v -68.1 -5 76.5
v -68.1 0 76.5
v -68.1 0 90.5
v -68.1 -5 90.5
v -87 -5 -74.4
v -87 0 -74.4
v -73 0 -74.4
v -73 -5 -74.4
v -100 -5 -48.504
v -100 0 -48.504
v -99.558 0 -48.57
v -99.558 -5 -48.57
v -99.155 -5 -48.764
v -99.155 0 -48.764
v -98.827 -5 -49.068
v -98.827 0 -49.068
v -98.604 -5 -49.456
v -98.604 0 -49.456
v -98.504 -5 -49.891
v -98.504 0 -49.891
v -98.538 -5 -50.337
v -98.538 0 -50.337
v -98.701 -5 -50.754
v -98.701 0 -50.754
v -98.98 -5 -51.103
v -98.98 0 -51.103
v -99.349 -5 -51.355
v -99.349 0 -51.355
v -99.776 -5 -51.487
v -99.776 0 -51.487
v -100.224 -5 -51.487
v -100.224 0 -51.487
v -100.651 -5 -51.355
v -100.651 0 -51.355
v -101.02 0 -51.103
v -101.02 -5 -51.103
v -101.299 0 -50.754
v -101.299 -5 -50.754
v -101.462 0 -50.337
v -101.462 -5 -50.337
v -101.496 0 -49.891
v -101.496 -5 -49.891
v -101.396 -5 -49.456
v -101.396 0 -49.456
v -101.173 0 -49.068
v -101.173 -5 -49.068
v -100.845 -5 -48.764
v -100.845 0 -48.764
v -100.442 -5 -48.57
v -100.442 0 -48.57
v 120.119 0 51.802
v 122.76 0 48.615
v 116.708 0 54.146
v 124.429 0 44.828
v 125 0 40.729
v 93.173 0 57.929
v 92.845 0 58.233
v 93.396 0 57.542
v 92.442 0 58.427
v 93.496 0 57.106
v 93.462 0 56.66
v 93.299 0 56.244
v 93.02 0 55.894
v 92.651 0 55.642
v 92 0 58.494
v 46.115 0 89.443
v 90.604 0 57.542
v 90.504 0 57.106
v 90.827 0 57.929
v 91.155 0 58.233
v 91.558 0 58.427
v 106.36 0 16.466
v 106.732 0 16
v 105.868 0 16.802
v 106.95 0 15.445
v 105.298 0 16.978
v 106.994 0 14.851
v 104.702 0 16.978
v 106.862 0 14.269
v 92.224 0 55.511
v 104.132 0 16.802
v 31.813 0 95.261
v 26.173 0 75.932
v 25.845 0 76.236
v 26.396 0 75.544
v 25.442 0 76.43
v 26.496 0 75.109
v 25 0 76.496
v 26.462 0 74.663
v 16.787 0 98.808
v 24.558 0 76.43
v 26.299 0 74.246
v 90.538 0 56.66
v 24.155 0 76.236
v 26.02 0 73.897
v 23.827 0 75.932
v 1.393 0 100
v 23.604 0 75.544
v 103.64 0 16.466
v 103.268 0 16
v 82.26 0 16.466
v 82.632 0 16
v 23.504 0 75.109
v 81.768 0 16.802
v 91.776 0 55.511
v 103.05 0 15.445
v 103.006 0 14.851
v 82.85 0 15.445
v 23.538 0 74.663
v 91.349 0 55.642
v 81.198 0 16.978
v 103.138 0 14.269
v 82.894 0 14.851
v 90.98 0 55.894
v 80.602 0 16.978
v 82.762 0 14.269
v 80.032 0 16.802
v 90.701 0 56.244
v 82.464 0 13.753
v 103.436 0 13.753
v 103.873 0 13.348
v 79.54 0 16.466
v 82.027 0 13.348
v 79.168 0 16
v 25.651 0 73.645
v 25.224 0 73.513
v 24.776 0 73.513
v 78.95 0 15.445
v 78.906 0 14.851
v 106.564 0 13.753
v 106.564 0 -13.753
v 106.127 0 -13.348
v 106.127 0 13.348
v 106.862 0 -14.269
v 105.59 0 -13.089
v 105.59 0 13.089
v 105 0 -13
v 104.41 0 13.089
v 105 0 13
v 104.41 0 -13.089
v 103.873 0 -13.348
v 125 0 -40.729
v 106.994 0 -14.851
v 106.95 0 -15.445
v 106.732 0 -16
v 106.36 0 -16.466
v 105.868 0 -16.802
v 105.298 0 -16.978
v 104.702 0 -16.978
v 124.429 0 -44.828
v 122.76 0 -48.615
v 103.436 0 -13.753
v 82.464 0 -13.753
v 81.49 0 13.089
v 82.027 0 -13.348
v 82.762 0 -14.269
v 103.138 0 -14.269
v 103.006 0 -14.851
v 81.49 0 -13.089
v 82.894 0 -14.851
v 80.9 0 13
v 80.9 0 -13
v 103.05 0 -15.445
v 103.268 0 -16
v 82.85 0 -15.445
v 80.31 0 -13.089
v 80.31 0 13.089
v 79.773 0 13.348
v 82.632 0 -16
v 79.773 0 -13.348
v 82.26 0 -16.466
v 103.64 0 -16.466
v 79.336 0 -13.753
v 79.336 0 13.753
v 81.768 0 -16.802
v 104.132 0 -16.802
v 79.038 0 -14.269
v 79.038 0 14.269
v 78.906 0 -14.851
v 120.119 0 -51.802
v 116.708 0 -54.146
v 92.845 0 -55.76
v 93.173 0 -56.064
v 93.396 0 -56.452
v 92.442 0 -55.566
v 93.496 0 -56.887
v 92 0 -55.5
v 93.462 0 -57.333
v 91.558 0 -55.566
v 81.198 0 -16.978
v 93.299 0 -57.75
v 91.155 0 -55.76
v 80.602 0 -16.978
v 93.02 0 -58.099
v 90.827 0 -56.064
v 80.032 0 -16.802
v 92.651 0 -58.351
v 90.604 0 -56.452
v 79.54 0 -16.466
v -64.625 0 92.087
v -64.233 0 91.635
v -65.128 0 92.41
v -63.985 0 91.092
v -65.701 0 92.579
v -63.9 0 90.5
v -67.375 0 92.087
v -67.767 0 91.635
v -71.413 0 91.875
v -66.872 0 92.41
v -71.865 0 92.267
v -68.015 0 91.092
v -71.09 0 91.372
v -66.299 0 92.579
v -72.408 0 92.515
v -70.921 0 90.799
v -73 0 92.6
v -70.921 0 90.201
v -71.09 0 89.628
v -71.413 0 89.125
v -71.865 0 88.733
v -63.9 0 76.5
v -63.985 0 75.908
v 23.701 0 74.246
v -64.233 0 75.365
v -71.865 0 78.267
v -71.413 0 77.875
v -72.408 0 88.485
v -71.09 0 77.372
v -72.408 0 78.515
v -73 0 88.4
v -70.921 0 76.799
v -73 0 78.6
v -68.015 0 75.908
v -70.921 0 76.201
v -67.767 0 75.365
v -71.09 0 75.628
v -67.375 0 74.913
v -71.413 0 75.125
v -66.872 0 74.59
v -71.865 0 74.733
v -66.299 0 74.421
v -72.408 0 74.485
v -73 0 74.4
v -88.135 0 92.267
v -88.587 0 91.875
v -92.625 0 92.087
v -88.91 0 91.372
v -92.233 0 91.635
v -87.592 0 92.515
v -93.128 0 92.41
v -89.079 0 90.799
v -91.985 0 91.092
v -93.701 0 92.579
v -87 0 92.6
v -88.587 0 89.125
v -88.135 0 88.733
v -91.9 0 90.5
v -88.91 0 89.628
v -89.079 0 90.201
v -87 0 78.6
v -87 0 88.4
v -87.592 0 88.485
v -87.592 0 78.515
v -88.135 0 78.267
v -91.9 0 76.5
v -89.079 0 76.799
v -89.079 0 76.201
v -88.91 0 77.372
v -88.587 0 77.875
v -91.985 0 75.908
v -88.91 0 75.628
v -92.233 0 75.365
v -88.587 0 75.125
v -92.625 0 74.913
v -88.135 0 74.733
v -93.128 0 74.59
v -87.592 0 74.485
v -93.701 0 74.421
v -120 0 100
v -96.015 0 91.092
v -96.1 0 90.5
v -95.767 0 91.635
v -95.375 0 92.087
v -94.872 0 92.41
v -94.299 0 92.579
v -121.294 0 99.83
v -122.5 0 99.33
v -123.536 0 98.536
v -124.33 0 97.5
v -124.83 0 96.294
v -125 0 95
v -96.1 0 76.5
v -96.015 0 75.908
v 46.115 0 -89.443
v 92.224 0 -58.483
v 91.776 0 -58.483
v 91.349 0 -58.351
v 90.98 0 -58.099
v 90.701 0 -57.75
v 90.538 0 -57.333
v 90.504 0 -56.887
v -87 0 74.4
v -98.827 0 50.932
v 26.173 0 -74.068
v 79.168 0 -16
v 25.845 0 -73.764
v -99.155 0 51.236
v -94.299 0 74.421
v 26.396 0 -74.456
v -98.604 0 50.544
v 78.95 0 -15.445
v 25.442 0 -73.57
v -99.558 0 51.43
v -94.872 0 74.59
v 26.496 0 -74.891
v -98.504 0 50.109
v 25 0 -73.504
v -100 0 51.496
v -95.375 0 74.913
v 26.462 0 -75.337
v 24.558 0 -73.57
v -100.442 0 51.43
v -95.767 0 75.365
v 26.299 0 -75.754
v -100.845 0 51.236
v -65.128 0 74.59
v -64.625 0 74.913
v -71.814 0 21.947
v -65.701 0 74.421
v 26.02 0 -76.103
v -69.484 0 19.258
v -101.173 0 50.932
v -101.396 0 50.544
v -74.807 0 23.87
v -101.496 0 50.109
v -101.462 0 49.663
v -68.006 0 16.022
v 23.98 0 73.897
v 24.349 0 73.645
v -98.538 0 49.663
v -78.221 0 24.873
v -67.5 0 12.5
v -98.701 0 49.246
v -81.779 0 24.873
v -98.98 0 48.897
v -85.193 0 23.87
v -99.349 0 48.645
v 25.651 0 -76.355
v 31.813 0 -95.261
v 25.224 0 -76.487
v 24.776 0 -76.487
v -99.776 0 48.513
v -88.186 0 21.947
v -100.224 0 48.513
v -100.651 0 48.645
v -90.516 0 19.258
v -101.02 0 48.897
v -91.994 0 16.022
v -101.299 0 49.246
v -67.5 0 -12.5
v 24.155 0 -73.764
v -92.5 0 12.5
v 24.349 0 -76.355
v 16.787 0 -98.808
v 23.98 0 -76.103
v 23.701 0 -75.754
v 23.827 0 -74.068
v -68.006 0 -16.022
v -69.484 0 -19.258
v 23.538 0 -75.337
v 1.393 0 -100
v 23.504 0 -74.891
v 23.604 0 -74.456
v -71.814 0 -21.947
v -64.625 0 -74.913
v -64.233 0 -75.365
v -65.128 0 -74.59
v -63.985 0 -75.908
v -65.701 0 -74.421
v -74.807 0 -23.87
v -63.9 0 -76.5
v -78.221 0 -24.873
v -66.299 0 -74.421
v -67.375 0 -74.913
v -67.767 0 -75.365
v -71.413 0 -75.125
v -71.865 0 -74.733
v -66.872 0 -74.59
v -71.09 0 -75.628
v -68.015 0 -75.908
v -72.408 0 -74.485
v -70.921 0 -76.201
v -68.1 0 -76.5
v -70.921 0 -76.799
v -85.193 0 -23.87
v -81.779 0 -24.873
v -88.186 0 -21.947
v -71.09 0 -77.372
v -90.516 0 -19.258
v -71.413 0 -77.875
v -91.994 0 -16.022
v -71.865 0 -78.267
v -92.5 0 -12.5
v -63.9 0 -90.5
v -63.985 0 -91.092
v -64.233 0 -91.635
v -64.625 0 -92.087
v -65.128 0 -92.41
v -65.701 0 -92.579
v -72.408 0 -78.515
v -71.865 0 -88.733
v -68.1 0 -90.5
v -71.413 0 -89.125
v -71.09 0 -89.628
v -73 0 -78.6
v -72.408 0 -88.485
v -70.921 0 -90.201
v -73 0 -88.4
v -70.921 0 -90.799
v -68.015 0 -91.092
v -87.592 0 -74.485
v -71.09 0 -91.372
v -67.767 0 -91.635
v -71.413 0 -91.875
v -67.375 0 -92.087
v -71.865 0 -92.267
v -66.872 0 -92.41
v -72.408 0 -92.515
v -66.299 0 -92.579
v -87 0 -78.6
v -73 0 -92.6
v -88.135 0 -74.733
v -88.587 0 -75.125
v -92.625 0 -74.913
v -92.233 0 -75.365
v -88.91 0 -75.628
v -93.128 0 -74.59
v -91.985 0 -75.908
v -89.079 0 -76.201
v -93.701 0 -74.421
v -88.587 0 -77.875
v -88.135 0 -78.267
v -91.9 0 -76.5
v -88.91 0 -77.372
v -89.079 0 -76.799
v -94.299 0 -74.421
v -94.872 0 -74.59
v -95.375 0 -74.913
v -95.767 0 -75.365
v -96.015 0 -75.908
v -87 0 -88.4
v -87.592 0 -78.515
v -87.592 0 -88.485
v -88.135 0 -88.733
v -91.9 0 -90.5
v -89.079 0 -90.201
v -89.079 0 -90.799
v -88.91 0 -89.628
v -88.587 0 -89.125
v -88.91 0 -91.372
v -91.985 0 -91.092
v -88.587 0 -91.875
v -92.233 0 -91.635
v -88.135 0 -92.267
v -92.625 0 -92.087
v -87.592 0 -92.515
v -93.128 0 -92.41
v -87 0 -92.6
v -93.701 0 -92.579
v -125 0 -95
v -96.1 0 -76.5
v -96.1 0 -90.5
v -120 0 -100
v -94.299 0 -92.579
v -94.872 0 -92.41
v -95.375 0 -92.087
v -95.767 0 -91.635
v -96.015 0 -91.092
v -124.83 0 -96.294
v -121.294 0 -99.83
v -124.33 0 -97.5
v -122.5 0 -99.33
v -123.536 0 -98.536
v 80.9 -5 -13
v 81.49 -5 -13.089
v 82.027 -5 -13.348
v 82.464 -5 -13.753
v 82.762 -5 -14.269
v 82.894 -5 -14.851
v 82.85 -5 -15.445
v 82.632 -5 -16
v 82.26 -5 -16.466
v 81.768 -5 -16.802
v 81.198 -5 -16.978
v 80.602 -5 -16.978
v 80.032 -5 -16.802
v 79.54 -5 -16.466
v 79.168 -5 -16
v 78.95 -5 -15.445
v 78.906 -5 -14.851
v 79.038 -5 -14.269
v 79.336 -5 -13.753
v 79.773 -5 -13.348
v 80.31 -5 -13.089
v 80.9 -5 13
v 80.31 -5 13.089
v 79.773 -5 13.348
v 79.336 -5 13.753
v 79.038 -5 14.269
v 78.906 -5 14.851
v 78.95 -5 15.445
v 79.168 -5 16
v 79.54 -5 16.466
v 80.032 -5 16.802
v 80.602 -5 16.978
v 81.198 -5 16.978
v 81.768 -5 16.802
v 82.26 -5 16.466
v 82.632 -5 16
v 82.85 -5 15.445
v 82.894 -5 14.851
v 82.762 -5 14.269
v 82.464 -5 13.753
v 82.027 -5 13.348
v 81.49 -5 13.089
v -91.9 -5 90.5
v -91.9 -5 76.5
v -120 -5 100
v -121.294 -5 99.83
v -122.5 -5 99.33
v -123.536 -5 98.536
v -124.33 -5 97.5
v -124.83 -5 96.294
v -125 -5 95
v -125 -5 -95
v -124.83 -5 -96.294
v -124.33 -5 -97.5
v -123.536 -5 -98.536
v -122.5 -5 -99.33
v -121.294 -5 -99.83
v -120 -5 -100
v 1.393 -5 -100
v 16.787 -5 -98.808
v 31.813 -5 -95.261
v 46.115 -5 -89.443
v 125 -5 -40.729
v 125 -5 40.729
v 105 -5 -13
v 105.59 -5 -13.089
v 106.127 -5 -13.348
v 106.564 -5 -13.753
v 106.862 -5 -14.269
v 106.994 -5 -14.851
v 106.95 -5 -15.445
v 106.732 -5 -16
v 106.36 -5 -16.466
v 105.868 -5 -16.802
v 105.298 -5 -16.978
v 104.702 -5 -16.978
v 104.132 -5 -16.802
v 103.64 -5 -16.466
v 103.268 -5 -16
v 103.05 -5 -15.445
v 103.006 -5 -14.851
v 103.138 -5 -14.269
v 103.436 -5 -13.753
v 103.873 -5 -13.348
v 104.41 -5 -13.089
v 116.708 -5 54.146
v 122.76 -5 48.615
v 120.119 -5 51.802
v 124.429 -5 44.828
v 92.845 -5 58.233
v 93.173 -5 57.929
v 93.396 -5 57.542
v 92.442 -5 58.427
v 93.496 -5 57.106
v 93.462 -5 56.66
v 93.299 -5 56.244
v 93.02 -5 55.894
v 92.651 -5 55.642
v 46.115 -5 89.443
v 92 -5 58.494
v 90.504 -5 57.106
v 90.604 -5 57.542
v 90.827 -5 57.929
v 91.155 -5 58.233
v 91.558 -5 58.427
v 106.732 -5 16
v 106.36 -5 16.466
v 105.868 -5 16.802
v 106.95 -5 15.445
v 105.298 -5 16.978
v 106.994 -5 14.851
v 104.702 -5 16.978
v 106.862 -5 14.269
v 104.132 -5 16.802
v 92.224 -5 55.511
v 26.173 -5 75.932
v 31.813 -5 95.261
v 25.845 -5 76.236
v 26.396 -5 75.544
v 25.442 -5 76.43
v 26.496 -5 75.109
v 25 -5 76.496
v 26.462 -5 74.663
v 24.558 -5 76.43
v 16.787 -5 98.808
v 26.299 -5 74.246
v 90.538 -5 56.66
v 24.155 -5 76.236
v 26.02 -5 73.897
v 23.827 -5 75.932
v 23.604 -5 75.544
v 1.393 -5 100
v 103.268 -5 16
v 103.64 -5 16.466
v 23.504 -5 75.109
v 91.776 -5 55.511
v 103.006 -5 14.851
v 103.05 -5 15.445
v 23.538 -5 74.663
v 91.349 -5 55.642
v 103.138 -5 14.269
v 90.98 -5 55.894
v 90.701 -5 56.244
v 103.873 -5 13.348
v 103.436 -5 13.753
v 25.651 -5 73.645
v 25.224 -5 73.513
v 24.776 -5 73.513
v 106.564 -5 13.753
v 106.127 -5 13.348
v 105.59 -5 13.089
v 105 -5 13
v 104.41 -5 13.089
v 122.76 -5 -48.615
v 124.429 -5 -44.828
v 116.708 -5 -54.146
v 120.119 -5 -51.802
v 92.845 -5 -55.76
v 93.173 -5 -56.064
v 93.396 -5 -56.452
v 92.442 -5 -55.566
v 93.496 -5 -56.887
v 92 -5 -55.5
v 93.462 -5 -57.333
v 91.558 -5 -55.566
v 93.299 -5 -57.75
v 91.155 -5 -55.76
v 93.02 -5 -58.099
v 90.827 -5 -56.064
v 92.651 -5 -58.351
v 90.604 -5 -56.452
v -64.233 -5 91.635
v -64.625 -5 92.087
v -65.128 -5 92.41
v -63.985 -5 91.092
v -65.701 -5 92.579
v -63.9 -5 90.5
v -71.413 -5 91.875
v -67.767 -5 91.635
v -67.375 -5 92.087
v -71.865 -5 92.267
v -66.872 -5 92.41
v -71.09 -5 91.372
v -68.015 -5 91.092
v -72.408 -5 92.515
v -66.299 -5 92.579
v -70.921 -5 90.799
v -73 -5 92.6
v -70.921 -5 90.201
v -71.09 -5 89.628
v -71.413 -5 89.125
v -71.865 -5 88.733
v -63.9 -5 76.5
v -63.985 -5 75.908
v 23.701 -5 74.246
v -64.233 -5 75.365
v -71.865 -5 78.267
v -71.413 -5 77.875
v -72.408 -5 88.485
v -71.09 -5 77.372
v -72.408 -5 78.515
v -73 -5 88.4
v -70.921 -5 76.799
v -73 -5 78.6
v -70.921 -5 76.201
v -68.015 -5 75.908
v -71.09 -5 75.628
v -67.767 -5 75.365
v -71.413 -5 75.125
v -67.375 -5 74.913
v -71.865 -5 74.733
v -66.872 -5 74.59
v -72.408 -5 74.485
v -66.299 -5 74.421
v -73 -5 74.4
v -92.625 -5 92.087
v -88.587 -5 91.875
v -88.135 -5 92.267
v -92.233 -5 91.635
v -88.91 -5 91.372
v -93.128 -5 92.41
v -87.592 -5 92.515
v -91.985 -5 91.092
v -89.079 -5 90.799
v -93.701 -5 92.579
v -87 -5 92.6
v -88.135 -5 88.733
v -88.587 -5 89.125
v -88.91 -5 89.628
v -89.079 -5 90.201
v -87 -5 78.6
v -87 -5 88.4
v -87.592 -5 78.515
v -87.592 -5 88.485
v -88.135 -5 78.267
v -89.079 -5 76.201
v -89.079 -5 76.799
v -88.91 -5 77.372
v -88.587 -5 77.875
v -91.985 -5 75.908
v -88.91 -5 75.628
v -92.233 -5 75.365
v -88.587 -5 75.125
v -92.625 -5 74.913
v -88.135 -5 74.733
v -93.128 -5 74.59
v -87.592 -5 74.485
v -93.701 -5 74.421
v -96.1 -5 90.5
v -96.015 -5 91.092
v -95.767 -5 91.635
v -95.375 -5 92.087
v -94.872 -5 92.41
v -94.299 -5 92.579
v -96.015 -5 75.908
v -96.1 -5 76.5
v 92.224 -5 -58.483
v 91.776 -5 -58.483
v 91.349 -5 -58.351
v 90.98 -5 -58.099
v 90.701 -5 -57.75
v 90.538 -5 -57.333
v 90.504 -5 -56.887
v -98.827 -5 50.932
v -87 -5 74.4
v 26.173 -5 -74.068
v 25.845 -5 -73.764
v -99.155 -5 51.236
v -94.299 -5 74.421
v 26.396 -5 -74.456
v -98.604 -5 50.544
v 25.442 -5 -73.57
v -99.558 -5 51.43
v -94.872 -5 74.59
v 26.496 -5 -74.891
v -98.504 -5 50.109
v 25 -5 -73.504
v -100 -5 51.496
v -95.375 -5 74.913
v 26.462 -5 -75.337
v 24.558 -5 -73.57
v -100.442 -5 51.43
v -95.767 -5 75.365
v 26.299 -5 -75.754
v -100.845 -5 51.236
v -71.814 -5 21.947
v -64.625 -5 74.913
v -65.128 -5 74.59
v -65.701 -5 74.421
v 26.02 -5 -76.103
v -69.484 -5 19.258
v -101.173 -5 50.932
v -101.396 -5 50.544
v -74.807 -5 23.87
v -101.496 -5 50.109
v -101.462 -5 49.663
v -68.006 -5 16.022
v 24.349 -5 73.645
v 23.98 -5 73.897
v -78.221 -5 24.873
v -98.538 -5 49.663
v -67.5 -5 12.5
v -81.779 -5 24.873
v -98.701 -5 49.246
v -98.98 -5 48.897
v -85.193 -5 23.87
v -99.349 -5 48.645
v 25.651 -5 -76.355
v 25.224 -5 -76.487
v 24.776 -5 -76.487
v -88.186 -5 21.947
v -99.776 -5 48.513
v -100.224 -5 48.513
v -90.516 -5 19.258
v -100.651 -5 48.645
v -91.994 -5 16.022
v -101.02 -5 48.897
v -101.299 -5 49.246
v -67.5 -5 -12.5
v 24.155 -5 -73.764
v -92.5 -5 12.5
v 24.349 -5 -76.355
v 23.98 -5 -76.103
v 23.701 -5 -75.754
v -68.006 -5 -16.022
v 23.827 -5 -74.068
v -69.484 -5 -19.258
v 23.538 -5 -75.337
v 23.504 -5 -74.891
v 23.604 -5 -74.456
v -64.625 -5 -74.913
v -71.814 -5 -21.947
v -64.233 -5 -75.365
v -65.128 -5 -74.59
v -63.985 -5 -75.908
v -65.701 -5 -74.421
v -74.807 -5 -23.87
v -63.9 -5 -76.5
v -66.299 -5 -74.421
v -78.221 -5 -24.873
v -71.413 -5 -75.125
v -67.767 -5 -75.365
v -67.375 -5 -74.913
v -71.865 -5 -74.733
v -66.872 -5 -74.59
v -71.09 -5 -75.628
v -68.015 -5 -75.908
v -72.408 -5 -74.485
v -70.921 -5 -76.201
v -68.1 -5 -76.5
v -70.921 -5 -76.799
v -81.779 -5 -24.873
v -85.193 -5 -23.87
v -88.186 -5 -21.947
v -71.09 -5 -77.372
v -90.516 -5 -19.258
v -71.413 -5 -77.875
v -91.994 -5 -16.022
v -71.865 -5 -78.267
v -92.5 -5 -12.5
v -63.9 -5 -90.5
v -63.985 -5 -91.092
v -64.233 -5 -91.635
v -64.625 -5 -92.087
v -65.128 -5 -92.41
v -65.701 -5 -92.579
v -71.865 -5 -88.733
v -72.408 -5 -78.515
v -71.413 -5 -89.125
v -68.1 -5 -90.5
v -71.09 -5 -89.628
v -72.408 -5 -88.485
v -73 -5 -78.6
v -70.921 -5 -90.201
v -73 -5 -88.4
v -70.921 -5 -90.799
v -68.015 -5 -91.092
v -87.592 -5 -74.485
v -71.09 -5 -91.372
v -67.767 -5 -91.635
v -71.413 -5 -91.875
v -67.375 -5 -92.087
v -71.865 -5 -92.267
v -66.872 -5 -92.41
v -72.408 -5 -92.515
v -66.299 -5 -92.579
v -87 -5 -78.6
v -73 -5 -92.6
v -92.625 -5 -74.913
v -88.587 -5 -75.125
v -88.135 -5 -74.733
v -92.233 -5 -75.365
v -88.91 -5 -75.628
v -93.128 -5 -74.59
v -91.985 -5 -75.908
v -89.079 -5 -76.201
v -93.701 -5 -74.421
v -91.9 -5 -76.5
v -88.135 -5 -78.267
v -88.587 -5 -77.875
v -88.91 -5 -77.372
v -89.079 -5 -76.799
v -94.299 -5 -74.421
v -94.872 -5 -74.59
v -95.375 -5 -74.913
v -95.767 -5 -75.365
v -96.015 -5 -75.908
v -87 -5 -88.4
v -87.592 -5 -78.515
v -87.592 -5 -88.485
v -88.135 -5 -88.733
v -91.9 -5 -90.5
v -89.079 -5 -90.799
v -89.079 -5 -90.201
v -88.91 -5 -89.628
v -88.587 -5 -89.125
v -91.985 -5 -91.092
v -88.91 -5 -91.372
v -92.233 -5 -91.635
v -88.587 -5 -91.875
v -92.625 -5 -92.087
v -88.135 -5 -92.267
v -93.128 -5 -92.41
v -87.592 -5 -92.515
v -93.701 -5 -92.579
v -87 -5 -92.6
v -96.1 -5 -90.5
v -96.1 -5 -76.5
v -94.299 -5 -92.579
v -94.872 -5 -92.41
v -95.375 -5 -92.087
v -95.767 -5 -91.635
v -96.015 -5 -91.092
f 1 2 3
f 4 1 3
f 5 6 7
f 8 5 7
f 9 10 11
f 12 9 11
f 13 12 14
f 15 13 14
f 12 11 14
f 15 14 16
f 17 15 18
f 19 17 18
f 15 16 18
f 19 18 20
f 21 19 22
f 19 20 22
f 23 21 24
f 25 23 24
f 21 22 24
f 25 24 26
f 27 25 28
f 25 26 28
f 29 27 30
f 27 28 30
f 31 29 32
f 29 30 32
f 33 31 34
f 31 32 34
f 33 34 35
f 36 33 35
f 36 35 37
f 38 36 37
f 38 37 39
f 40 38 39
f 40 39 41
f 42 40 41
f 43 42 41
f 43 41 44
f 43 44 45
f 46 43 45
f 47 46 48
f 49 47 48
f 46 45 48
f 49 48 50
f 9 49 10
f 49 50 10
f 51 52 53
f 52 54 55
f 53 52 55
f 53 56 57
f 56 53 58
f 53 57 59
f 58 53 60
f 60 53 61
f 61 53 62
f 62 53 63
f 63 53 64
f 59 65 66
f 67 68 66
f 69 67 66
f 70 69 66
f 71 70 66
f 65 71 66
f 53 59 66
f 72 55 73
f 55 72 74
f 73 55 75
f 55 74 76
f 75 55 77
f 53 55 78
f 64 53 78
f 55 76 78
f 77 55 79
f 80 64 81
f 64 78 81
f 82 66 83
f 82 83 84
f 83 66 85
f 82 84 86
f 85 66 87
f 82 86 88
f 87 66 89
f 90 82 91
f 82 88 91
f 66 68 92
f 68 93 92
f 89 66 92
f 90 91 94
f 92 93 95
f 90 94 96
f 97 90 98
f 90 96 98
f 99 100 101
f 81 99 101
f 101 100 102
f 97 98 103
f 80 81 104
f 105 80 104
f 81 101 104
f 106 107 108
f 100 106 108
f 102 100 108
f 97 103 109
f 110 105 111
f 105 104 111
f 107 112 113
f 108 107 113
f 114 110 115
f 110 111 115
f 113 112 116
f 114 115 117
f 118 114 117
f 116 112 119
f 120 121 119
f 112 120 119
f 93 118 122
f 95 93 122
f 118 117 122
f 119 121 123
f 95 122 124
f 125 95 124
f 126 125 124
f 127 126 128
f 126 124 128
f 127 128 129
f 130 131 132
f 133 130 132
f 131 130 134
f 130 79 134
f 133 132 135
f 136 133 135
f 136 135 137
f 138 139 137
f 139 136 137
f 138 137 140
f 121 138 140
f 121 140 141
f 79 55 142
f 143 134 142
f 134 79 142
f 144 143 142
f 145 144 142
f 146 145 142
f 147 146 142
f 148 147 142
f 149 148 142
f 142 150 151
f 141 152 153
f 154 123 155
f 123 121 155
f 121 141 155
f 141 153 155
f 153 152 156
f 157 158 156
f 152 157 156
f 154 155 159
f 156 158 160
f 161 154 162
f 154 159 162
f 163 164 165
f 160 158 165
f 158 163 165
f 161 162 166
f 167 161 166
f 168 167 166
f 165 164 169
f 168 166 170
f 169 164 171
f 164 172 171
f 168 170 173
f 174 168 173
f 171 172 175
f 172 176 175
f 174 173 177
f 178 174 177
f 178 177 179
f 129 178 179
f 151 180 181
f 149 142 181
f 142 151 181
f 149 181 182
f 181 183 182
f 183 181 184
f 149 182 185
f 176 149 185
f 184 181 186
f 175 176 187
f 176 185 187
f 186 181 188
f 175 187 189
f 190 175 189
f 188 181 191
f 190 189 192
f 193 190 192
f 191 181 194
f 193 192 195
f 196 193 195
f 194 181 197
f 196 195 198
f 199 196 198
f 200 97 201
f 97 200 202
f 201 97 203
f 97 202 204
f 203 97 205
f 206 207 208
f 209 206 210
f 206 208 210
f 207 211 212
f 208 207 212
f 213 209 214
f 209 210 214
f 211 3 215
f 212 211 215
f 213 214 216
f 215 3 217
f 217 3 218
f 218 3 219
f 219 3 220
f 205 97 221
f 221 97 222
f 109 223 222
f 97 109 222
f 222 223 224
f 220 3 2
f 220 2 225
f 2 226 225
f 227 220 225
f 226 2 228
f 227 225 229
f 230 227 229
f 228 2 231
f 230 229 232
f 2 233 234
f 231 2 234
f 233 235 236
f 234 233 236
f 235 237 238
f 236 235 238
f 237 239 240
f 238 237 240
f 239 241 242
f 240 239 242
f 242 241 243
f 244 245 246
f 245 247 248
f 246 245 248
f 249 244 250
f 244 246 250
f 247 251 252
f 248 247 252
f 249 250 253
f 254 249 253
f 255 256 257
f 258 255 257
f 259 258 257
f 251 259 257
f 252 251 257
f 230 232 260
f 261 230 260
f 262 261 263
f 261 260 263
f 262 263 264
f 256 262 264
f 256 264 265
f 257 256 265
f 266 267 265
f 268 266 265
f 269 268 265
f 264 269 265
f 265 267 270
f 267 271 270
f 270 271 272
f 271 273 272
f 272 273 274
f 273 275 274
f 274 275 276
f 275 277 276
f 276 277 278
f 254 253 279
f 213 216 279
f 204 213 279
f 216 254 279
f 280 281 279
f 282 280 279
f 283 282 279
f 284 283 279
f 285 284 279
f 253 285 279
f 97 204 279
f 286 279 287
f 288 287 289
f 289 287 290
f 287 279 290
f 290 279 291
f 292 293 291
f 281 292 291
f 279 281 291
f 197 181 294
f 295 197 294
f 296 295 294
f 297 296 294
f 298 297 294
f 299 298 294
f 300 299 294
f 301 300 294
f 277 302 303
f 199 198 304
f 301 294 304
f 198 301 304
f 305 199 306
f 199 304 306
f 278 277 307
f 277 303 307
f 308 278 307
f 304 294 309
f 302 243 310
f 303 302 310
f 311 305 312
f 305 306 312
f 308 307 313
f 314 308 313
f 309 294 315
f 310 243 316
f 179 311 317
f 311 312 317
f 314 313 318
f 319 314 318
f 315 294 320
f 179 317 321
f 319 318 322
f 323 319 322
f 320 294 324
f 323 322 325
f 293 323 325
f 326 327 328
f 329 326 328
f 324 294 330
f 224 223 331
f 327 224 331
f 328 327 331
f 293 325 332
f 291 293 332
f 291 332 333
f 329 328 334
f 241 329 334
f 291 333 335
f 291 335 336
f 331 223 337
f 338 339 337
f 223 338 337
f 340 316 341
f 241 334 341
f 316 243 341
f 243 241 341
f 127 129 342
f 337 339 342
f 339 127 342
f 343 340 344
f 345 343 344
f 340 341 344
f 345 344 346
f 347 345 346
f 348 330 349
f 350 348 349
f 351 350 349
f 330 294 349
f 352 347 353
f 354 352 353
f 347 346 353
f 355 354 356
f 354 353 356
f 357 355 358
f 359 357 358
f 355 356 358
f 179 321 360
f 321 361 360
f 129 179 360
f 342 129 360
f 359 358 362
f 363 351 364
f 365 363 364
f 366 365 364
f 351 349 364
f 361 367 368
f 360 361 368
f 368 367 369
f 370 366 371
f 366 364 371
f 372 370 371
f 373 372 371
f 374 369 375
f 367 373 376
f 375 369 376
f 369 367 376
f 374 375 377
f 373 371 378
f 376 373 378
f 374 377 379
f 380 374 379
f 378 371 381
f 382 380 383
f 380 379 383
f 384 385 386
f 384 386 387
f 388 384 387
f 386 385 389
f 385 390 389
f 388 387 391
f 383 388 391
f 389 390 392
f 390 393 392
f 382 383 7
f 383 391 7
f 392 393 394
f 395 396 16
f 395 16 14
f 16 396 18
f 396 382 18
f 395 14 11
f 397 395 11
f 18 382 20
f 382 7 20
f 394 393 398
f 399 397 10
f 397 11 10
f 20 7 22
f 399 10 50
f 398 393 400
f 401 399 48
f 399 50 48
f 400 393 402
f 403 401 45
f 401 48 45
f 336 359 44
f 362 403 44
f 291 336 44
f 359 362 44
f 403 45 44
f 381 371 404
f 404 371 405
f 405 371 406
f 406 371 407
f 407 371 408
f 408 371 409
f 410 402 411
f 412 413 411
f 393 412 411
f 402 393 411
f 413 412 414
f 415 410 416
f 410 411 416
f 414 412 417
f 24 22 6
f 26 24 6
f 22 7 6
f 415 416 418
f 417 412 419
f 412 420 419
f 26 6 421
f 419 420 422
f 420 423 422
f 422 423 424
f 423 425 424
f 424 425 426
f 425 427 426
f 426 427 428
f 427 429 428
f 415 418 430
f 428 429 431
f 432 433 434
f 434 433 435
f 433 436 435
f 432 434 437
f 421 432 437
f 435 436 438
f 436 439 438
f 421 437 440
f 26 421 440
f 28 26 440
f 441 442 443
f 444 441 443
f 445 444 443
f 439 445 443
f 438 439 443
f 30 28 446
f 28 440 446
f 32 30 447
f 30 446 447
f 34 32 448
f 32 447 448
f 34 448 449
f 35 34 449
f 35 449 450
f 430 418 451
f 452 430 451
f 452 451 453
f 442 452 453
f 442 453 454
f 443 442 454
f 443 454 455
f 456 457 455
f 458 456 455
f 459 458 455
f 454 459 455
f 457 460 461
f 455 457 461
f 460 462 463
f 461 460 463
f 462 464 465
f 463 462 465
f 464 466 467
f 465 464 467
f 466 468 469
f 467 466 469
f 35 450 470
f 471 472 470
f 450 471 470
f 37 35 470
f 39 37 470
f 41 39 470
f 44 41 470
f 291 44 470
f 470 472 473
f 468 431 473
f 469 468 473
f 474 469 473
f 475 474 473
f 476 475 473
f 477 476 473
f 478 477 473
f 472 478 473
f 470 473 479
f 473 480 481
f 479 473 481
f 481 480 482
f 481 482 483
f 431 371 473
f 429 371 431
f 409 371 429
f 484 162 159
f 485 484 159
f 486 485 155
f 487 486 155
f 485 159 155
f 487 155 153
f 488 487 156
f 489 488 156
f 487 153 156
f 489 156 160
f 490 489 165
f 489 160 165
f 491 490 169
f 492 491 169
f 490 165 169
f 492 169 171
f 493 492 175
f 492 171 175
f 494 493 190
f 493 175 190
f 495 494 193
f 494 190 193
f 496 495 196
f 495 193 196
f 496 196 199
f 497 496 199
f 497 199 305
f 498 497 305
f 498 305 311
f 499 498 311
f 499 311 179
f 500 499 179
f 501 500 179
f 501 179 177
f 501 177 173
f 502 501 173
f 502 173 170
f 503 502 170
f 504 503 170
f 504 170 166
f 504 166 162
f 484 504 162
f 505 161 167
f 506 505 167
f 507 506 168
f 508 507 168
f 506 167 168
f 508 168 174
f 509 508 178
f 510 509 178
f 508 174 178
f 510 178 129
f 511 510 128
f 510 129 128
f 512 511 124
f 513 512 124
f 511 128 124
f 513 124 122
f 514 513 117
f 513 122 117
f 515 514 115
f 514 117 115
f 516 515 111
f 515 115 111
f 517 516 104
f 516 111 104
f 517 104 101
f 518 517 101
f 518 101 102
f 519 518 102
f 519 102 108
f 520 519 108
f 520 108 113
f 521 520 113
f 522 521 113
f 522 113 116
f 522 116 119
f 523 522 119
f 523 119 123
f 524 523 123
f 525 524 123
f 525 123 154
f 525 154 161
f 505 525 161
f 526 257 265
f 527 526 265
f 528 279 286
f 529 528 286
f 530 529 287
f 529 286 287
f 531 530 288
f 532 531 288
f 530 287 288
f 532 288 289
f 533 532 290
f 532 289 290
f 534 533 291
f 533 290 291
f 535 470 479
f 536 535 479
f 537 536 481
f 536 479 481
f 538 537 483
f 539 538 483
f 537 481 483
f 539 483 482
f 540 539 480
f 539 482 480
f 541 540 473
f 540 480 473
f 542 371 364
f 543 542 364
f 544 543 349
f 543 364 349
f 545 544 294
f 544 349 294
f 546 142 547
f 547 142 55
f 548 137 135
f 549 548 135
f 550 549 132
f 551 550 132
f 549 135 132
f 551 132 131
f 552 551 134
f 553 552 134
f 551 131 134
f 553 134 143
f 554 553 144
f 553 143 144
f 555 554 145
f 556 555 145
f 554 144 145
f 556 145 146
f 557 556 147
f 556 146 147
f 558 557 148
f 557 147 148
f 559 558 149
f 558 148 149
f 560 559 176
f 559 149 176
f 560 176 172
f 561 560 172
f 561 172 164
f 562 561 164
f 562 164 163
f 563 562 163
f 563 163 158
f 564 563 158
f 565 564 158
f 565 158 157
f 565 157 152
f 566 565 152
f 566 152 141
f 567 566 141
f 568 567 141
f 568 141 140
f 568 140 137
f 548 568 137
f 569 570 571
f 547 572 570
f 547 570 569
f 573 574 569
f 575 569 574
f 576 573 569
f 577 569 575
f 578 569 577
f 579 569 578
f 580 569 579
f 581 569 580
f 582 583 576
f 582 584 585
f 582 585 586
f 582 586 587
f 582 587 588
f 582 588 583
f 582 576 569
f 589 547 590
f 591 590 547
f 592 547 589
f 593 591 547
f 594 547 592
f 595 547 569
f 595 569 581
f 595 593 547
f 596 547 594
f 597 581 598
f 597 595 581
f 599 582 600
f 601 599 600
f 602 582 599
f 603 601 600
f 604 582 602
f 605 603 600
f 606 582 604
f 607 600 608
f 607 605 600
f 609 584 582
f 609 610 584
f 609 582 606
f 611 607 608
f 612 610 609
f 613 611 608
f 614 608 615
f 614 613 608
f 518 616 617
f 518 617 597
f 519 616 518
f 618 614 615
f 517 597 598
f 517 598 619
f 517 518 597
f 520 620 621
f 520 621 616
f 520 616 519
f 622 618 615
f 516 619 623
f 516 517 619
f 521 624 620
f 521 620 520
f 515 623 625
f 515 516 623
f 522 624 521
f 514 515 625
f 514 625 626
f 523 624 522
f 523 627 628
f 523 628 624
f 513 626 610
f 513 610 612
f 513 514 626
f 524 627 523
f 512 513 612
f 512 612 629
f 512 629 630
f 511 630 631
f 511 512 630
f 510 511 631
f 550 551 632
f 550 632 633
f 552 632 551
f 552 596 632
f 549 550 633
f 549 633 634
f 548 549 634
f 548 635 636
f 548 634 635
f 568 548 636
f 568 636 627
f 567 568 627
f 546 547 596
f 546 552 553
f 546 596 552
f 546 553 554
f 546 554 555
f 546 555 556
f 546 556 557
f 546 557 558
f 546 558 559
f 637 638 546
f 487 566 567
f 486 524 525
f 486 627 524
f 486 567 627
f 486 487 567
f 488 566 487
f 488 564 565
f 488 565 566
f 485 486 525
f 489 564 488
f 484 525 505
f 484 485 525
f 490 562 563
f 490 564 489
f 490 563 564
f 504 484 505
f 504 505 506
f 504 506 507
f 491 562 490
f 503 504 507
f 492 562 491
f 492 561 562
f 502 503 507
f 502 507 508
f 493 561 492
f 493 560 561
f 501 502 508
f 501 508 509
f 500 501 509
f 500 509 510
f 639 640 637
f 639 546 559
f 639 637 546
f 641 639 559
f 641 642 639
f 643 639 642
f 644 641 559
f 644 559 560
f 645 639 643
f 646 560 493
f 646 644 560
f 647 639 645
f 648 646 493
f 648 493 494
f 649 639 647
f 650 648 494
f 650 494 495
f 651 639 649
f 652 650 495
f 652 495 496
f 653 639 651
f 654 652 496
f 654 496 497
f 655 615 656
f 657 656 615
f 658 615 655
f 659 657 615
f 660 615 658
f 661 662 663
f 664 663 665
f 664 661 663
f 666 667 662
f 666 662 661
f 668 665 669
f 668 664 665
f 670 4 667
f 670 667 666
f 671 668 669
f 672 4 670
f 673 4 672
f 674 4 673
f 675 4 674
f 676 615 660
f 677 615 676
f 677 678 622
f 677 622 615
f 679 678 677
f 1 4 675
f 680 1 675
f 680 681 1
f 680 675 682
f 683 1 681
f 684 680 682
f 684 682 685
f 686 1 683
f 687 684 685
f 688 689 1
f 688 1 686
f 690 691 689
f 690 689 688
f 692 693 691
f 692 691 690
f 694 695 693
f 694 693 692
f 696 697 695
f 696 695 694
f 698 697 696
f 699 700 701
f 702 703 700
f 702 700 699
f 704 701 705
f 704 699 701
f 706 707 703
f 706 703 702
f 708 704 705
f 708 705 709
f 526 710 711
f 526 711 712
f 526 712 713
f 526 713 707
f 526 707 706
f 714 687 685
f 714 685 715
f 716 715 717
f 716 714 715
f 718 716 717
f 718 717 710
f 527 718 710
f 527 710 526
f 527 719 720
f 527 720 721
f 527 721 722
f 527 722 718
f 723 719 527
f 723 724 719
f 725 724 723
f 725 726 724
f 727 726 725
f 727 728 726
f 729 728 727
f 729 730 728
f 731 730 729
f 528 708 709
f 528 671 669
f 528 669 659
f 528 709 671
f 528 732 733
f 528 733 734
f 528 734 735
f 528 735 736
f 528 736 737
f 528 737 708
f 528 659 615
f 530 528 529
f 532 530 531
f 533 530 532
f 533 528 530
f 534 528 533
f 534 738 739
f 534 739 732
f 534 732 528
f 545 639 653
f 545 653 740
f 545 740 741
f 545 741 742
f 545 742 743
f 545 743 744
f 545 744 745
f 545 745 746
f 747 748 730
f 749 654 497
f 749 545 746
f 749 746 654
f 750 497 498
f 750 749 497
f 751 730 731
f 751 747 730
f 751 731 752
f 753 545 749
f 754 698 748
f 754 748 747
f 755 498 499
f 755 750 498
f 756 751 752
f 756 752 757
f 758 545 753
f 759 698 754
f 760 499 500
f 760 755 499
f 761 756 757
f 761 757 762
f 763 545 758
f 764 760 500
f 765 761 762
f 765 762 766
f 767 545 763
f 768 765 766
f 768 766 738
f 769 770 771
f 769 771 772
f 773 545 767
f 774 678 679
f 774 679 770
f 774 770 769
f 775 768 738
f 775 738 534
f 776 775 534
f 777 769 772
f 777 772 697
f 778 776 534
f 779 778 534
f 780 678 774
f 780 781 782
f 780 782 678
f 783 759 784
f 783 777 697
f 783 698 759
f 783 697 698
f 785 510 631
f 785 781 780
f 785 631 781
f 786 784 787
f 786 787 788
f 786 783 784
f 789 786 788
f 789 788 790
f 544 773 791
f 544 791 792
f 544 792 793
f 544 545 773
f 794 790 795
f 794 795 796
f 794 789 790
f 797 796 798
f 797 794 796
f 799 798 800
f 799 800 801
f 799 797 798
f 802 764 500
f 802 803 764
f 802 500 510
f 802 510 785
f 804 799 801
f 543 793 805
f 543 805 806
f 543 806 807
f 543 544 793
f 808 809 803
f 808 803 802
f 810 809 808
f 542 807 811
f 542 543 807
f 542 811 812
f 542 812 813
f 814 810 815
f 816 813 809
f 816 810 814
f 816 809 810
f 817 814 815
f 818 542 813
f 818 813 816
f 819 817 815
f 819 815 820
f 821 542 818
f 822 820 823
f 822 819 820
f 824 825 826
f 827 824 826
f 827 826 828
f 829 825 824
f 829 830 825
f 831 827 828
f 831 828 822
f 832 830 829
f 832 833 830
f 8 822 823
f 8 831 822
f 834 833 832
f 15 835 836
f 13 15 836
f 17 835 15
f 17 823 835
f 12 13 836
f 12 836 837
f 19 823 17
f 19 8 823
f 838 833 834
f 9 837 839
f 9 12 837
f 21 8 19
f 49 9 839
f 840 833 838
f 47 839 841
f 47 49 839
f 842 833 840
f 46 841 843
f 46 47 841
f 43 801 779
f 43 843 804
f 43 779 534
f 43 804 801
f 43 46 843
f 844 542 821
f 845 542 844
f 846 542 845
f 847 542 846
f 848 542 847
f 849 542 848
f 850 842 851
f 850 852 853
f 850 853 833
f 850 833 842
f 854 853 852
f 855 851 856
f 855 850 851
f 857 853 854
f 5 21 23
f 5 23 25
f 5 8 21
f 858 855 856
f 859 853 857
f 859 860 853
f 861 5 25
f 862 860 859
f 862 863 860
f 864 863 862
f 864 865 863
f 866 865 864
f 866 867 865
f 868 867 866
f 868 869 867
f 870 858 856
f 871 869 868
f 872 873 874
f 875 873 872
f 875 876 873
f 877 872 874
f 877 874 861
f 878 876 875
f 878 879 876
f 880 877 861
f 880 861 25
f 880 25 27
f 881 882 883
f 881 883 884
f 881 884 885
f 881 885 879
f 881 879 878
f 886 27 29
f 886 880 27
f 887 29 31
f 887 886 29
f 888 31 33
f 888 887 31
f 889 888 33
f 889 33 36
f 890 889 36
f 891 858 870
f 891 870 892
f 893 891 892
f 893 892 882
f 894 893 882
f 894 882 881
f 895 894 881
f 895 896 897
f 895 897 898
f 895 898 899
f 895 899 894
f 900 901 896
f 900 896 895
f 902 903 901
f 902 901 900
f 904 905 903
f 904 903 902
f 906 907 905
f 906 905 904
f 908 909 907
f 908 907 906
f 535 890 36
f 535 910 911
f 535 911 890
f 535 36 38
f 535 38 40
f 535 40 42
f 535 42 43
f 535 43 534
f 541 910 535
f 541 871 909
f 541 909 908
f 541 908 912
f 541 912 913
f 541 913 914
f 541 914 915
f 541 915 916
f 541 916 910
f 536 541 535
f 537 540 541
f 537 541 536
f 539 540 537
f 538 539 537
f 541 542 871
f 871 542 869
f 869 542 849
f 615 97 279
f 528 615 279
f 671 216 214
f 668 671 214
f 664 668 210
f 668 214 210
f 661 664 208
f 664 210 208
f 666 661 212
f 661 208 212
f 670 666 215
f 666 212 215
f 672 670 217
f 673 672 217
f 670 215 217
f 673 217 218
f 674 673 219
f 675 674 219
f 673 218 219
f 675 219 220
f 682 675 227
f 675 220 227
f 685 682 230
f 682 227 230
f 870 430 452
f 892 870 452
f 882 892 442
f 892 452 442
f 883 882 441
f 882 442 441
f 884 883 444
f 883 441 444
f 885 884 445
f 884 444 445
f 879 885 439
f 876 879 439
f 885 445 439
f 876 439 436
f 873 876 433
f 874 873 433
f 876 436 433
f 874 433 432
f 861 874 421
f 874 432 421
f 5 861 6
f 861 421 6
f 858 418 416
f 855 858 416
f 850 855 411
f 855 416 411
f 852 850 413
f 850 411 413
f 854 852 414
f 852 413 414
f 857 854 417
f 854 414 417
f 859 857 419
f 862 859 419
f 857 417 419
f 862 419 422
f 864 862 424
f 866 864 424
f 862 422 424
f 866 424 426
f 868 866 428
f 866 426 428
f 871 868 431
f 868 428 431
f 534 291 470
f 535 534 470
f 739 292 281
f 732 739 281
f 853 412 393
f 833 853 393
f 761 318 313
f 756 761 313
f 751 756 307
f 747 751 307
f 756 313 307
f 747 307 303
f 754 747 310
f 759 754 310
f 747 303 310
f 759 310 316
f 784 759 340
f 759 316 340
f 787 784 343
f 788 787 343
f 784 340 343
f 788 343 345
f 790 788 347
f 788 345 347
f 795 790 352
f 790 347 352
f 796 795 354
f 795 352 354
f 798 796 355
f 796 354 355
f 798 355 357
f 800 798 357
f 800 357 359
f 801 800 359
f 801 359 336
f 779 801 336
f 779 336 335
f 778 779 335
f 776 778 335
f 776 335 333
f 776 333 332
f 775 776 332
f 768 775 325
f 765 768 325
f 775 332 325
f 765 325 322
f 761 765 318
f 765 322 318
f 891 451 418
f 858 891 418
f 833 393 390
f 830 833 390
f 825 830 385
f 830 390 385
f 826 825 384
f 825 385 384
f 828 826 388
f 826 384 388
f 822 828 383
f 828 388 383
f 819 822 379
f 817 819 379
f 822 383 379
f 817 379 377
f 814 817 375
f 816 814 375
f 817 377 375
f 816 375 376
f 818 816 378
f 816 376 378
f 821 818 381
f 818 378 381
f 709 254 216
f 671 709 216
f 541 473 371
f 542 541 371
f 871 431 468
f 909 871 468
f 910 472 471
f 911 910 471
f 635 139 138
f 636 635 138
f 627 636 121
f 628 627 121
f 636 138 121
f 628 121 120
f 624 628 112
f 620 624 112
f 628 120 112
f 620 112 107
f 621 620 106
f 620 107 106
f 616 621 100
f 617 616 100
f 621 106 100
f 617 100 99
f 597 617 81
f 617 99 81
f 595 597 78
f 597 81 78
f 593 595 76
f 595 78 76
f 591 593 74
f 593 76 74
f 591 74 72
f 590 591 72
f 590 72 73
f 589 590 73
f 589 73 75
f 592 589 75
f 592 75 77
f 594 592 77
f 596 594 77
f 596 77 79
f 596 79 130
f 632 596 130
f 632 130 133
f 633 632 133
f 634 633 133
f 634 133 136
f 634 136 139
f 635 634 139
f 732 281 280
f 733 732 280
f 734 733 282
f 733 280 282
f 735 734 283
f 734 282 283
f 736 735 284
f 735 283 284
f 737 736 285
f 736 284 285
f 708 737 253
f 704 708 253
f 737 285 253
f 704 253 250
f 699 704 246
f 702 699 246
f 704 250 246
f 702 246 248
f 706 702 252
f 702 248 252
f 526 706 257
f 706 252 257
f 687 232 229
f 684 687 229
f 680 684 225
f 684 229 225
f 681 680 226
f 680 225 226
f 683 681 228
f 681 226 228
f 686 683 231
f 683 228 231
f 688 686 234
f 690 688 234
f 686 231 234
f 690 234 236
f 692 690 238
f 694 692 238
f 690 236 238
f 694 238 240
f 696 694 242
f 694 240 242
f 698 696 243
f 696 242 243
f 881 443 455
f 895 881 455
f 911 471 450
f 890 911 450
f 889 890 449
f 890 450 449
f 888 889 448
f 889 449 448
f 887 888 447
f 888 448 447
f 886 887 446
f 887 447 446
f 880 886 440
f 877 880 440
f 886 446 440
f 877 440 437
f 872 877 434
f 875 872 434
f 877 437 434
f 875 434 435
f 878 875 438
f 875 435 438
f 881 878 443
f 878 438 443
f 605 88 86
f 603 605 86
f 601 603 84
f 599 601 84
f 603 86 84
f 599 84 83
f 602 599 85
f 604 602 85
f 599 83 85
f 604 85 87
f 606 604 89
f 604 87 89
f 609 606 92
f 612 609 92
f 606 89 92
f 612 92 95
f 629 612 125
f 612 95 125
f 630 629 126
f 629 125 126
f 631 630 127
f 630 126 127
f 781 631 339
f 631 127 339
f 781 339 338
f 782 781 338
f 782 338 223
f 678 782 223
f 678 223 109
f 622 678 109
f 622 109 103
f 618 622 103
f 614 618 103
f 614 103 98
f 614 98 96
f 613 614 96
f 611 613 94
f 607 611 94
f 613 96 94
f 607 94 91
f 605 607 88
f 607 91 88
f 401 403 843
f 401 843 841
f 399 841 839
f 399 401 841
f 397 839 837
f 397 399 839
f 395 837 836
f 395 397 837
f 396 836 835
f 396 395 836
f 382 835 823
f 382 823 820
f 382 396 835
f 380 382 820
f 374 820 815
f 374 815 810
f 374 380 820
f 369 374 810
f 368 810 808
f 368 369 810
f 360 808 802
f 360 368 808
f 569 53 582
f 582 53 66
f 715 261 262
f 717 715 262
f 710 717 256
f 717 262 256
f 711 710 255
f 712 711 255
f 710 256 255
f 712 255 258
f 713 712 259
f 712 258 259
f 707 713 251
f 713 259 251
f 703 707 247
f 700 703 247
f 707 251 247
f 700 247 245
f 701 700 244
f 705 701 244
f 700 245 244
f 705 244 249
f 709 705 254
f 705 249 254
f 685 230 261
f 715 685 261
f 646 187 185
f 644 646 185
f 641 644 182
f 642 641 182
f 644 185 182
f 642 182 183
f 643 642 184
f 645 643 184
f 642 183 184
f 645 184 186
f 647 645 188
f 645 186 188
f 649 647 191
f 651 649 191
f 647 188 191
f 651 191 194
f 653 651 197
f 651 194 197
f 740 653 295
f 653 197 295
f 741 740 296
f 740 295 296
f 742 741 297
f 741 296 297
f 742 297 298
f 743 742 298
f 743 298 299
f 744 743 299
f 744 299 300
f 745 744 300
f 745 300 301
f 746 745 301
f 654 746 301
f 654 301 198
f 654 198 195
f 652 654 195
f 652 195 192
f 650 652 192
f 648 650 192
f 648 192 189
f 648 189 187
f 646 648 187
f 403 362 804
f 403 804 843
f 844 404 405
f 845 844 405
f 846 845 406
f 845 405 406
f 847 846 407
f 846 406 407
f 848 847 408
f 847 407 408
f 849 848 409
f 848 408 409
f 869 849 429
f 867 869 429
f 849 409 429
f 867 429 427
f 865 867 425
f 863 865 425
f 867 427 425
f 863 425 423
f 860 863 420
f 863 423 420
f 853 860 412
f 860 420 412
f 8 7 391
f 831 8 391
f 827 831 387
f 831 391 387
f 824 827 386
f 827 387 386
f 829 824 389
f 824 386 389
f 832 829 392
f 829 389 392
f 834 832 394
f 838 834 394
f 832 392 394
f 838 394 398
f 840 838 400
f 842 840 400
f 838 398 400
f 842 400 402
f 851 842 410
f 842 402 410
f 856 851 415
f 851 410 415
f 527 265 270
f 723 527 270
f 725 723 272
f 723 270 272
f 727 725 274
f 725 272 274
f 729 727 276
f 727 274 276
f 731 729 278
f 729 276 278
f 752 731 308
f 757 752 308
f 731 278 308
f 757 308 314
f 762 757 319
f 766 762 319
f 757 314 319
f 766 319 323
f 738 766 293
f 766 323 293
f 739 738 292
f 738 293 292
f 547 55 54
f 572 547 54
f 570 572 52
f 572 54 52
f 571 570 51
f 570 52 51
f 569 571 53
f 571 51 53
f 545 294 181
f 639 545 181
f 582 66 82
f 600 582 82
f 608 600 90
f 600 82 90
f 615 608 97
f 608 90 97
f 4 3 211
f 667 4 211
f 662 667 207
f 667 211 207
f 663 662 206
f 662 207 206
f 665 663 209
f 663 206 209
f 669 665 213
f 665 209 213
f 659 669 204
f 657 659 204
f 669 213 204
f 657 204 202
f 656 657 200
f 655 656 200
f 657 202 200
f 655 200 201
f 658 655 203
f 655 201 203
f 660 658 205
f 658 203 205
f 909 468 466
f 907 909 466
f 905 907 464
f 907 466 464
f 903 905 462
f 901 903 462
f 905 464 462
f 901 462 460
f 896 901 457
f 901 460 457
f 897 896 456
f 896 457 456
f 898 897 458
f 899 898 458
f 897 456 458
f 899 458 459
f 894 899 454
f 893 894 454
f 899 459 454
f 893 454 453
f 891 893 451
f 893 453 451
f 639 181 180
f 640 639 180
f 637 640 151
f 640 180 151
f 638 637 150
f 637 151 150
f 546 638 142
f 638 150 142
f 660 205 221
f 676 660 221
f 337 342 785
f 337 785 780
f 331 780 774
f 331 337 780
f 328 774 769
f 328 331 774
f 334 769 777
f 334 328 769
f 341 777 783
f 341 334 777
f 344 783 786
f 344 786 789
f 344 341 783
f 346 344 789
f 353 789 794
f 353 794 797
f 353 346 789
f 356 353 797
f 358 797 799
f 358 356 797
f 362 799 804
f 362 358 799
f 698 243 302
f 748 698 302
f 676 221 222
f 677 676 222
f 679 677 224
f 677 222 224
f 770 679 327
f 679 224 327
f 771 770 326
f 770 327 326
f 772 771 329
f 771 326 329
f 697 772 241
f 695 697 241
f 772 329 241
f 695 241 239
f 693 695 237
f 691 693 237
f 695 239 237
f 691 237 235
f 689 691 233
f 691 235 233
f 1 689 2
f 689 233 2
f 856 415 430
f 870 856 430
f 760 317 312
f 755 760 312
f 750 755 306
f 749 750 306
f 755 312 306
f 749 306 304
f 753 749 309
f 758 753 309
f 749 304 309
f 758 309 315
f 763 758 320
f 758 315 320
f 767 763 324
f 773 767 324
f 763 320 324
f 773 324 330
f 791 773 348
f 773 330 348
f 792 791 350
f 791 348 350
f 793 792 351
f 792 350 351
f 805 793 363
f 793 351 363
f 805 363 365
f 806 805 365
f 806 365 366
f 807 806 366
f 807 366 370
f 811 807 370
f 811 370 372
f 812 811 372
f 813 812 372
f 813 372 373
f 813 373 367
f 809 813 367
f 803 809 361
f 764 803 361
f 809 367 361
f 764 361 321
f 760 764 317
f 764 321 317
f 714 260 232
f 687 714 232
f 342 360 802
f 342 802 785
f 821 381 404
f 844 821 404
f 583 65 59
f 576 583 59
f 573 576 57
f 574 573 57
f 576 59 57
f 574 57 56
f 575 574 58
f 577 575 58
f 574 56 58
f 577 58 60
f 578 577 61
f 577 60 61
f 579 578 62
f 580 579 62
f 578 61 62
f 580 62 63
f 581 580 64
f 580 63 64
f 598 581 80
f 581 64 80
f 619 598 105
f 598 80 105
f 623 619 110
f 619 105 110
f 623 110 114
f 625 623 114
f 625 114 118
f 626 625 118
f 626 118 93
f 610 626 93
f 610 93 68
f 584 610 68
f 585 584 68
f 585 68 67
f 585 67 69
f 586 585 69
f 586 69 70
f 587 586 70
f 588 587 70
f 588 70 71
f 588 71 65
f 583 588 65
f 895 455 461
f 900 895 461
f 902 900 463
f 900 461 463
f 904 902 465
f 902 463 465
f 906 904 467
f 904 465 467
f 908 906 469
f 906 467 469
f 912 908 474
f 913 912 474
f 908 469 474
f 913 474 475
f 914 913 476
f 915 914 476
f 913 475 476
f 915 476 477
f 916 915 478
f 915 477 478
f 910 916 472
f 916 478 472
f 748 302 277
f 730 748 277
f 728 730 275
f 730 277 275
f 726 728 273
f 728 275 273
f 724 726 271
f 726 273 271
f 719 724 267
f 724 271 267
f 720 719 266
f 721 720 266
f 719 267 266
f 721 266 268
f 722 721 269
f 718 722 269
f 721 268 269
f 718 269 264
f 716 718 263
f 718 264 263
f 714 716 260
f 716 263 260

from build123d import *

# Parameters (mm, degrees)
BOSS_EXTRUDE2_DEPTH = 5
SKETCH7_R           = 1.5
CUT_EXTRUDE1_DEPTH  = 5
CUT_EXTRUDE2_DEPTH  = 5
SKETCH14_R          = 1.5
CUT_EXTRUDE3_DEPTH  = 161.15617378
SKETCH16_R          = 2
CUT_EXTRUDE4_DEPTH  = 161.15617378
CUT_EXTRUDE5_DEPTH  = 5


with BuildPart() as part:
    # Sketch1 → Boss-Extrude2 (new body)
    with BuildSketch(Plane(origin=(0, 0, 0), x_dir=(1, 0, 0), z_dir=(0, 1, 0))):
        with BuildLine():
            Line((-120, 100), (1.39320225, 100))
            ThreePointArc((1.39320225, 100), (24.368494305, 97.324898947), (46.1145618, 89.4427191))
            Line((46.1145618, 89.4427191), (116.708203932, 54.145898034))
            ThreePointArc((116.708203932, 54.145898034), (122.759762125, 48.615456851), (125, 40.729490169))
            Line((125, 40.729490169), (125, -40.729490169))
            ThreePointArc((125, -40.729490169), (122.759762125, -48.615456851), (116.708203932, -54.145898034))
            Line((116.708203932, -54.145898034), (46.1145618, -89.4427191))
            ThreePointArc((46.1145618, -89.4427191), (24.368494305, -97.324898947), (1.39320225, -100))
            Line((1.39320225, -100), (-120, -100))
            ThreePointArc((-120, -100), (-123.535533906, -98.535533906), (-125, -95))
            Line((-125, -95), (-125, 95))
            ThreePointArc((-125, 95), (-123.535533906, 98.535533906), (-120, 100))
        make_face()
    extrude(amount=-BOSS_EXTRUDE2_DEPTH)

    # Sketch7 → Cut-Extrude1 (cut)
    with BuildSketch(Plane(origin=(0, 0, 0), x_dir=(1, 0, 0), z_dir=(0, 1, 0))):
        with Locations(Location((-100, 50.003580751, 0), (0, 0, 270))):
            Circle(SKETCH7_R)
        with Locations(Location((-100, -49.996419249, 0), (0, 0, 270))):
            Circle(SKETCH7_R)
        with Locations(Location((25, 75.003580751, 0), (0, 0, 270))):
            Circle(SKETCH7_R)
        with Locations(Location((25, -74.996419249, 0), (0, 0, 270))):
            Circle(SKETCH7_R)
    extrude(amount=-CUT_EXTRUDE1_DEPTH, mode=Mode.SUBTRACT)

    # Sketch8 → Cut-Extrude2 (cut)
    with BuildSketch(Plane(origin=(0, 0, 0), x_dir=(1, 0, 0), z_dir=(0, 1, 0))):
        with BuildLine():
            Line((-96.1, 90.5), (-96.1, 76.5))
            ThreePointArc((-96.1, 76.5), (-94, 74.4), (-91.9, 76.5))
            Line((-91.9, 76.5), (-91.9, 90.5))
            ThreePointArc((-91.9, 90.5), (-94, 92.6), (-96.1, 90.5))
        make_face()
        with BuildLine():
            Line((-68.1, 90.5), (-68.1, 76.5))
            ThreePointArc((-68.1, 76.5), (-66, 74.4), (-63.9, 76.5))
            Line((-63.9, 76.5), (-63.9, 90.5))
            ThreePointArc((-63.9, 90.5), (-66, 92.6), (-68.1, 90.5))
        make_face()
        with BuildLine():
            Line((-87.000000572, 88.4), (-73, 88.4))
            ThreePointArc((-73, 88.4), (-70.9, 90.5), (-73, 92.6))
            Line((-73, 92.6), (-87, 92.6))
            ThreePointArc((-87, 92.6), (-89.100000572, 90.500000286), (-87.000000572, 88.4))
        make_face()
        with BuildLine():
            Line((-87, 74.4), (-73, 74.4))
            ThreePointArc((-73, 74.4), (-70.9, 76.5), (-73, 78.6))
            Line((-73, 78.6), (-87, 78.6))
            ThreePointArc((-87, 78.6), (-89.1, 76.5), (-87, 74.4))
        make_face()
        with BuildLine():
            Line((-87, -78.6), (-73, -78.6))
            ThreePointArc((-73, -78.6), (-70.9, -76.5), (-73, -74.4))
            Line((-73, -74.4), (-87, -74.4))
            ThreePointArc((-87, -74.4), (-89.1, -76.5), (-87, -78.6))
        make_face()
        with BuildLine():
            Line((-87, -92.6), (-73, -92.6))
            ThreePointArc((-73, -92.6), (-70.9, -90.5), (-73, -88.4))
            Line((-73, -88.4), (-87.000000572, -88.4))
            ThreePointArc((-87.000000572, -88.4), (-89.100000572, -90.500000286), (-87, -92.6))
        make_face()
        with BuildLine():
            Line((-63.9, -90.5), (-63.9, -76.5))
            ThreePointArc((-63.9, -76.5), (-66, -74.4), (-68.1, -76.5))
            Line((-68.1, -76.5), (-68.1, -90.5))
            ThreePointArc((-68.1, -90.5), (-66, -92.6), (-63.9, -90.5))
        make_face()
        with BuildLine():
            Line((-91.9, -90.5), (-91.9, -76.5))
            ThreePointArc((-91.9, -76.5), (-94, -74.4), (-96.1, -76.5))
            Line((-96.1, -76.5), (-96.1, -90.5))
            ThreePointArc((-96.1, -90.5), (-94, -92.6), (-91.9, -90.5))
        make_face()
    extrude(amount=-CUT_EXTRUDE2_DEPTH, mode=Mode.SUBTRACT)

    # Sketch14 → Cut-Extrude3 (cut, through all)
    with BuildSketch(Plane(origin=(0, 0, 0), x_dir=(1, 0, 0), z_dir=(0, 1, 0))):
        with Locations(Location((92, -56.993839984, 0), (0, 0, 270))):
            Circle(SKETCH14_R)
        with Locations(Location((92, 56.999582207, 0), (0, 0, 270))):
            Circle(SKETCH14_R)
    extrude(amount=-CUT_EXTRUDE3_DEPTH, mode=Mode.SUBTRACT)

    # Sketch16 → Cut-Extrude4 (cut, through all)
    with BuildSketch(Plane(origin=(0, 0, 0), x_dir=(1, 0, 0), z_dir=(0, 1, 0))):
        with Locations(Location((80.9, 15, 0), (0, 0, 270))):
            Circle(SKETCH16_R)
        with Locations(Location((105, 15, 0), (0, 0, 270))):
            Circle(SKETCH16_R)
        with Locations(Location((105, -15, 0), (0, 0, 90))):
            Circle(SKETCH16_R)
        with Locations(Location((80.9, -15, 0), (0, 0, 90))):
            Circle(SKETCH16_R)
    extrude(amount=-CUT_EXTRUDE4_DEPTH, mode=Mode.SUBTRACT)

    # Sketch17 → Cut-Extrude5 (cut)
    with BuildSketch(Plane(origin=(0, 0, 0), x_dir=(1, 0, 0), z_dir=(0, 1, 0))):
        with BuildLine():
            Line((-67.5, 12.5), (-67.5, -12.5))
            ThreePointArc((-67.5, -12.5), (-80, -25), (-92.5, -12.5))
            Line((-92.5, -12.5), (-92.5, 12.5))
            ThreePointArc((-92.5, 12.5), (-80, 25), (-67.5, 12.5))
        make_face()
    extrude(amount=-CUT_EXTRUDE5_DEPTH, mode=Mode.SUBTRACT)


solid = part.part
